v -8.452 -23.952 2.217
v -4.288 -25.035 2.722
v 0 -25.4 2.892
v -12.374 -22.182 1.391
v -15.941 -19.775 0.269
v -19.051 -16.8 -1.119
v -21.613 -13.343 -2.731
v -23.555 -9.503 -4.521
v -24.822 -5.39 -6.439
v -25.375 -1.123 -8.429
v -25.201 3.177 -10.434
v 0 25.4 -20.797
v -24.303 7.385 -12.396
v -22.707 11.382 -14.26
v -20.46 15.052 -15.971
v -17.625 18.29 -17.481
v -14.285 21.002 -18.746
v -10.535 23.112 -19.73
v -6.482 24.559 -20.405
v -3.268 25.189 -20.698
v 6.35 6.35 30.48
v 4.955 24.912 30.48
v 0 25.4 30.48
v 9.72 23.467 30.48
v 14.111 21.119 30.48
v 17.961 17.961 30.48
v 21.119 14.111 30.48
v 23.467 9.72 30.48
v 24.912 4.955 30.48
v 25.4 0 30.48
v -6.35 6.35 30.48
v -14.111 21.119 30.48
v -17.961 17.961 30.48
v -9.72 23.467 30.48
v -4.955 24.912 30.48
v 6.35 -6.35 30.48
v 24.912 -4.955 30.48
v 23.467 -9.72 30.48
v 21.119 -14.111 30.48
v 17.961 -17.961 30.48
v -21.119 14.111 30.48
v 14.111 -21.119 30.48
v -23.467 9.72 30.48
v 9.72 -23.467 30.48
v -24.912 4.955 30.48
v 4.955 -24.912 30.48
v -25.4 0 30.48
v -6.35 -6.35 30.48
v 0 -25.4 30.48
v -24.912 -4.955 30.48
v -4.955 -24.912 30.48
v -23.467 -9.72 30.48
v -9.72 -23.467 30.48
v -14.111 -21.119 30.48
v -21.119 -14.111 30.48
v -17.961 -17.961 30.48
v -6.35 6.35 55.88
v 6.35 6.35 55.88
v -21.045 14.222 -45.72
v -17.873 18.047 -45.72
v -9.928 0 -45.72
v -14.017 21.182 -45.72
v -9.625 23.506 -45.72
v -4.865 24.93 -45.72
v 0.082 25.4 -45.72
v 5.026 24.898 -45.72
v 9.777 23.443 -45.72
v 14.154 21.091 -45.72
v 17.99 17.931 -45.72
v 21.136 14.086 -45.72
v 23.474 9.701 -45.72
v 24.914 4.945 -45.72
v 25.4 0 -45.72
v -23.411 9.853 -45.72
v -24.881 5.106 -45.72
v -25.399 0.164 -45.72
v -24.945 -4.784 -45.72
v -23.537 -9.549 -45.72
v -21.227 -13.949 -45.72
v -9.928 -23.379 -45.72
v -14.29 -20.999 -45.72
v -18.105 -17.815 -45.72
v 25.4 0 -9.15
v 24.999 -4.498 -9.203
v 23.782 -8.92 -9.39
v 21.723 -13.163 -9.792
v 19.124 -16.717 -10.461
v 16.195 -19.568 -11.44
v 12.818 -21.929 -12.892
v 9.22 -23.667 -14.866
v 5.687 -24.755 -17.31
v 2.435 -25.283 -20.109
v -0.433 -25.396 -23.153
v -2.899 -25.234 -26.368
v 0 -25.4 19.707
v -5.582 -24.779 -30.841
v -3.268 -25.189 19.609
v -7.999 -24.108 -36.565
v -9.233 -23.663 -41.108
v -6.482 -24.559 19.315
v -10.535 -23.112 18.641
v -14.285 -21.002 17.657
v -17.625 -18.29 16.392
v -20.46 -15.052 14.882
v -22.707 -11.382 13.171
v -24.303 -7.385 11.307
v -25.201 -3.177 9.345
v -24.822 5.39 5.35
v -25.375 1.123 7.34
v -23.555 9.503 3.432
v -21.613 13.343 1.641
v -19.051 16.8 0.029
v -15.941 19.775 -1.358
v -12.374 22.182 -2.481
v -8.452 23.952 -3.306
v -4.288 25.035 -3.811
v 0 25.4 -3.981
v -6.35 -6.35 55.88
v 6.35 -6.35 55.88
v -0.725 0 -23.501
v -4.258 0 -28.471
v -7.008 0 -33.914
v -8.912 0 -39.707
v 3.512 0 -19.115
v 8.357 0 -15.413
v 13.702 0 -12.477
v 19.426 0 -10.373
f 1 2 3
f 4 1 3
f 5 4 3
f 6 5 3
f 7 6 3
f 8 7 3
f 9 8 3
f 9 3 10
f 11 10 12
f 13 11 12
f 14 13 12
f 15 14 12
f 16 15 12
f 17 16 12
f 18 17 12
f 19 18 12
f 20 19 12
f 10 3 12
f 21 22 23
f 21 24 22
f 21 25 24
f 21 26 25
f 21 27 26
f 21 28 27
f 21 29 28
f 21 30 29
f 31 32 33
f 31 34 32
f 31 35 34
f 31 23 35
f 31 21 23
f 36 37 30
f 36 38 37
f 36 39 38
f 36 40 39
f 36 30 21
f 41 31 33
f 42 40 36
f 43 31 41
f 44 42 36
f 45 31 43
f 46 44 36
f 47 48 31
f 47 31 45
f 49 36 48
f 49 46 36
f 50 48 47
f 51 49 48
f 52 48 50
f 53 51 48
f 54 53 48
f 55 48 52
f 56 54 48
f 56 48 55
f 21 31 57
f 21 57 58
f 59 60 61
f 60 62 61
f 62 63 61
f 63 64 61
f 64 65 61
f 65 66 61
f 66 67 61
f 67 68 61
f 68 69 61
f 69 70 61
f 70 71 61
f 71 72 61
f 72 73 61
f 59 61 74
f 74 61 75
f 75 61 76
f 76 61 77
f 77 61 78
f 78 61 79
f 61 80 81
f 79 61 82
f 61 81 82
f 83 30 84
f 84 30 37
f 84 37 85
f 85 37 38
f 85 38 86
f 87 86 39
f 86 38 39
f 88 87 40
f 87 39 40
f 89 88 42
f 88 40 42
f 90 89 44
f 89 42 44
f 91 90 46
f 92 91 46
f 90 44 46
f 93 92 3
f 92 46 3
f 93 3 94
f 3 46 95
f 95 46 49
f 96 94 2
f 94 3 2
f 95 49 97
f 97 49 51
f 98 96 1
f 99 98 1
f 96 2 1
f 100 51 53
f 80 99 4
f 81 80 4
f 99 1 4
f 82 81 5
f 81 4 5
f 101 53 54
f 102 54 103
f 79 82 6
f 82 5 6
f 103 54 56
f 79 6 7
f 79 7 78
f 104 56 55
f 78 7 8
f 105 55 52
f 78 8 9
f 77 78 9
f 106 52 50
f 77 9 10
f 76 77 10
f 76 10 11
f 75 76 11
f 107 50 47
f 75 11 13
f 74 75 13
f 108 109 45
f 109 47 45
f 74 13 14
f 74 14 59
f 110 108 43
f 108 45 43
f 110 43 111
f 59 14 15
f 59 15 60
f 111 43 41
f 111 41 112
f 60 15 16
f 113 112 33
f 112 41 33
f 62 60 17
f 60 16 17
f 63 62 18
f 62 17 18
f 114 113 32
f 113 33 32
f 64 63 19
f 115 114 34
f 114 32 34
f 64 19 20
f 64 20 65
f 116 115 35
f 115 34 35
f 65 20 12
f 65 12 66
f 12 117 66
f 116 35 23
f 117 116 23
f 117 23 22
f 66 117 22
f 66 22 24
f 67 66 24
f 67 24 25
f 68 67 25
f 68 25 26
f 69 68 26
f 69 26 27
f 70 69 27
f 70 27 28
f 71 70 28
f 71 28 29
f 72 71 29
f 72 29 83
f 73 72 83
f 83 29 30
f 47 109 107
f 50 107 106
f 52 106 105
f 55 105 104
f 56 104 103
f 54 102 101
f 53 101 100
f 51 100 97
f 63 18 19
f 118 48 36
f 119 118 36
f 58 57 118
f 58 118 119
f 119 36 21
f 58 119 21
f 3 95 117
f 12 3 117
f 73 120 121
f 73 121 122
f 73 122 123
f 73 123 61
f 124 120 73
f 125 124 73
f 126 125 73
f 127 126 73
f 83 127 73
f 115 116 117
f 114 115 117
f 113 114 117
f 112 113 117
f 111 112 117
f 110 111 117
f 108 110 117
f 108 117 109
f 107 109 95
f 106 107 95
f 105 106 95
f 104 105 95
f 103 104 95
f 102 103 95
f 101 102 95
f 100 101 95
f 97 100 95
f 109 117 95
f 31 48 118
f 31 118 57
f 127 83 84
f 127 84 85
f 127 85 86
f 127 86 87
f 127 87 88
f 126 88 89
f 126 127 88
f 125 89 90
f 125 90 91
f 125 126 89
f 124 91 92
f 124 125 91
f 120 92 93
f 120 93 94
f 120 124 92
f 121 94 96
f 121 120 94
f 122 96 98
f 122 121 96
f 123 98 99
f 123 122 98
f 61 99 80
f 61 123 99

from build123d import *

# Parameters (mm, degrees)
F0_W     = 25.4
F0_H     = 76.2
F3_DEPTH = 58.42
F4_W     = 12.7
F4_H     = 12.7
F5_DEPTH = 25.4
F6_R     = 40.643977
F7_DEPTH = 87.884


with BuildPart() as f1:
    # F0 (on Front) → F1 (revolve)
    with BuildSketch(Plane.XZ):
        with Locations((12.7, -7.62)):
            Rectangle(F0_W, F0_H)
    revolve(axis=Axis((0, 0, -7.62), (0, 0, -1)))

    # F2 (on Right) → F3 (cut)
    with BuildSketch(Plane.YZ):
        Polygon((45.269145, -13.24631), (-37.608135, 25.4), (-44.048837, 11.587869), (38.828442, -27.058441), align=None)
    extrude(amount=-F3_DEPTH, mode=Mode.SUBTRACT)

    # F4 (on face) → F5 (join)
    with BuildSketch(Plane.XY.offset(30.48)):
        Rectangle(F4_W, F4_H)
    extrude(amount=F5_DEPTH)

    # F6 (on Front) → F7 (cut)
    with BuildSketch(Plane.XZ):
        with Locations((30.542457, -49.467545)):
            Circle(F6_R)
    extrude(amount=F7_DEPTH, mode=Mode.SUBTRACT)


solid = f1.part
